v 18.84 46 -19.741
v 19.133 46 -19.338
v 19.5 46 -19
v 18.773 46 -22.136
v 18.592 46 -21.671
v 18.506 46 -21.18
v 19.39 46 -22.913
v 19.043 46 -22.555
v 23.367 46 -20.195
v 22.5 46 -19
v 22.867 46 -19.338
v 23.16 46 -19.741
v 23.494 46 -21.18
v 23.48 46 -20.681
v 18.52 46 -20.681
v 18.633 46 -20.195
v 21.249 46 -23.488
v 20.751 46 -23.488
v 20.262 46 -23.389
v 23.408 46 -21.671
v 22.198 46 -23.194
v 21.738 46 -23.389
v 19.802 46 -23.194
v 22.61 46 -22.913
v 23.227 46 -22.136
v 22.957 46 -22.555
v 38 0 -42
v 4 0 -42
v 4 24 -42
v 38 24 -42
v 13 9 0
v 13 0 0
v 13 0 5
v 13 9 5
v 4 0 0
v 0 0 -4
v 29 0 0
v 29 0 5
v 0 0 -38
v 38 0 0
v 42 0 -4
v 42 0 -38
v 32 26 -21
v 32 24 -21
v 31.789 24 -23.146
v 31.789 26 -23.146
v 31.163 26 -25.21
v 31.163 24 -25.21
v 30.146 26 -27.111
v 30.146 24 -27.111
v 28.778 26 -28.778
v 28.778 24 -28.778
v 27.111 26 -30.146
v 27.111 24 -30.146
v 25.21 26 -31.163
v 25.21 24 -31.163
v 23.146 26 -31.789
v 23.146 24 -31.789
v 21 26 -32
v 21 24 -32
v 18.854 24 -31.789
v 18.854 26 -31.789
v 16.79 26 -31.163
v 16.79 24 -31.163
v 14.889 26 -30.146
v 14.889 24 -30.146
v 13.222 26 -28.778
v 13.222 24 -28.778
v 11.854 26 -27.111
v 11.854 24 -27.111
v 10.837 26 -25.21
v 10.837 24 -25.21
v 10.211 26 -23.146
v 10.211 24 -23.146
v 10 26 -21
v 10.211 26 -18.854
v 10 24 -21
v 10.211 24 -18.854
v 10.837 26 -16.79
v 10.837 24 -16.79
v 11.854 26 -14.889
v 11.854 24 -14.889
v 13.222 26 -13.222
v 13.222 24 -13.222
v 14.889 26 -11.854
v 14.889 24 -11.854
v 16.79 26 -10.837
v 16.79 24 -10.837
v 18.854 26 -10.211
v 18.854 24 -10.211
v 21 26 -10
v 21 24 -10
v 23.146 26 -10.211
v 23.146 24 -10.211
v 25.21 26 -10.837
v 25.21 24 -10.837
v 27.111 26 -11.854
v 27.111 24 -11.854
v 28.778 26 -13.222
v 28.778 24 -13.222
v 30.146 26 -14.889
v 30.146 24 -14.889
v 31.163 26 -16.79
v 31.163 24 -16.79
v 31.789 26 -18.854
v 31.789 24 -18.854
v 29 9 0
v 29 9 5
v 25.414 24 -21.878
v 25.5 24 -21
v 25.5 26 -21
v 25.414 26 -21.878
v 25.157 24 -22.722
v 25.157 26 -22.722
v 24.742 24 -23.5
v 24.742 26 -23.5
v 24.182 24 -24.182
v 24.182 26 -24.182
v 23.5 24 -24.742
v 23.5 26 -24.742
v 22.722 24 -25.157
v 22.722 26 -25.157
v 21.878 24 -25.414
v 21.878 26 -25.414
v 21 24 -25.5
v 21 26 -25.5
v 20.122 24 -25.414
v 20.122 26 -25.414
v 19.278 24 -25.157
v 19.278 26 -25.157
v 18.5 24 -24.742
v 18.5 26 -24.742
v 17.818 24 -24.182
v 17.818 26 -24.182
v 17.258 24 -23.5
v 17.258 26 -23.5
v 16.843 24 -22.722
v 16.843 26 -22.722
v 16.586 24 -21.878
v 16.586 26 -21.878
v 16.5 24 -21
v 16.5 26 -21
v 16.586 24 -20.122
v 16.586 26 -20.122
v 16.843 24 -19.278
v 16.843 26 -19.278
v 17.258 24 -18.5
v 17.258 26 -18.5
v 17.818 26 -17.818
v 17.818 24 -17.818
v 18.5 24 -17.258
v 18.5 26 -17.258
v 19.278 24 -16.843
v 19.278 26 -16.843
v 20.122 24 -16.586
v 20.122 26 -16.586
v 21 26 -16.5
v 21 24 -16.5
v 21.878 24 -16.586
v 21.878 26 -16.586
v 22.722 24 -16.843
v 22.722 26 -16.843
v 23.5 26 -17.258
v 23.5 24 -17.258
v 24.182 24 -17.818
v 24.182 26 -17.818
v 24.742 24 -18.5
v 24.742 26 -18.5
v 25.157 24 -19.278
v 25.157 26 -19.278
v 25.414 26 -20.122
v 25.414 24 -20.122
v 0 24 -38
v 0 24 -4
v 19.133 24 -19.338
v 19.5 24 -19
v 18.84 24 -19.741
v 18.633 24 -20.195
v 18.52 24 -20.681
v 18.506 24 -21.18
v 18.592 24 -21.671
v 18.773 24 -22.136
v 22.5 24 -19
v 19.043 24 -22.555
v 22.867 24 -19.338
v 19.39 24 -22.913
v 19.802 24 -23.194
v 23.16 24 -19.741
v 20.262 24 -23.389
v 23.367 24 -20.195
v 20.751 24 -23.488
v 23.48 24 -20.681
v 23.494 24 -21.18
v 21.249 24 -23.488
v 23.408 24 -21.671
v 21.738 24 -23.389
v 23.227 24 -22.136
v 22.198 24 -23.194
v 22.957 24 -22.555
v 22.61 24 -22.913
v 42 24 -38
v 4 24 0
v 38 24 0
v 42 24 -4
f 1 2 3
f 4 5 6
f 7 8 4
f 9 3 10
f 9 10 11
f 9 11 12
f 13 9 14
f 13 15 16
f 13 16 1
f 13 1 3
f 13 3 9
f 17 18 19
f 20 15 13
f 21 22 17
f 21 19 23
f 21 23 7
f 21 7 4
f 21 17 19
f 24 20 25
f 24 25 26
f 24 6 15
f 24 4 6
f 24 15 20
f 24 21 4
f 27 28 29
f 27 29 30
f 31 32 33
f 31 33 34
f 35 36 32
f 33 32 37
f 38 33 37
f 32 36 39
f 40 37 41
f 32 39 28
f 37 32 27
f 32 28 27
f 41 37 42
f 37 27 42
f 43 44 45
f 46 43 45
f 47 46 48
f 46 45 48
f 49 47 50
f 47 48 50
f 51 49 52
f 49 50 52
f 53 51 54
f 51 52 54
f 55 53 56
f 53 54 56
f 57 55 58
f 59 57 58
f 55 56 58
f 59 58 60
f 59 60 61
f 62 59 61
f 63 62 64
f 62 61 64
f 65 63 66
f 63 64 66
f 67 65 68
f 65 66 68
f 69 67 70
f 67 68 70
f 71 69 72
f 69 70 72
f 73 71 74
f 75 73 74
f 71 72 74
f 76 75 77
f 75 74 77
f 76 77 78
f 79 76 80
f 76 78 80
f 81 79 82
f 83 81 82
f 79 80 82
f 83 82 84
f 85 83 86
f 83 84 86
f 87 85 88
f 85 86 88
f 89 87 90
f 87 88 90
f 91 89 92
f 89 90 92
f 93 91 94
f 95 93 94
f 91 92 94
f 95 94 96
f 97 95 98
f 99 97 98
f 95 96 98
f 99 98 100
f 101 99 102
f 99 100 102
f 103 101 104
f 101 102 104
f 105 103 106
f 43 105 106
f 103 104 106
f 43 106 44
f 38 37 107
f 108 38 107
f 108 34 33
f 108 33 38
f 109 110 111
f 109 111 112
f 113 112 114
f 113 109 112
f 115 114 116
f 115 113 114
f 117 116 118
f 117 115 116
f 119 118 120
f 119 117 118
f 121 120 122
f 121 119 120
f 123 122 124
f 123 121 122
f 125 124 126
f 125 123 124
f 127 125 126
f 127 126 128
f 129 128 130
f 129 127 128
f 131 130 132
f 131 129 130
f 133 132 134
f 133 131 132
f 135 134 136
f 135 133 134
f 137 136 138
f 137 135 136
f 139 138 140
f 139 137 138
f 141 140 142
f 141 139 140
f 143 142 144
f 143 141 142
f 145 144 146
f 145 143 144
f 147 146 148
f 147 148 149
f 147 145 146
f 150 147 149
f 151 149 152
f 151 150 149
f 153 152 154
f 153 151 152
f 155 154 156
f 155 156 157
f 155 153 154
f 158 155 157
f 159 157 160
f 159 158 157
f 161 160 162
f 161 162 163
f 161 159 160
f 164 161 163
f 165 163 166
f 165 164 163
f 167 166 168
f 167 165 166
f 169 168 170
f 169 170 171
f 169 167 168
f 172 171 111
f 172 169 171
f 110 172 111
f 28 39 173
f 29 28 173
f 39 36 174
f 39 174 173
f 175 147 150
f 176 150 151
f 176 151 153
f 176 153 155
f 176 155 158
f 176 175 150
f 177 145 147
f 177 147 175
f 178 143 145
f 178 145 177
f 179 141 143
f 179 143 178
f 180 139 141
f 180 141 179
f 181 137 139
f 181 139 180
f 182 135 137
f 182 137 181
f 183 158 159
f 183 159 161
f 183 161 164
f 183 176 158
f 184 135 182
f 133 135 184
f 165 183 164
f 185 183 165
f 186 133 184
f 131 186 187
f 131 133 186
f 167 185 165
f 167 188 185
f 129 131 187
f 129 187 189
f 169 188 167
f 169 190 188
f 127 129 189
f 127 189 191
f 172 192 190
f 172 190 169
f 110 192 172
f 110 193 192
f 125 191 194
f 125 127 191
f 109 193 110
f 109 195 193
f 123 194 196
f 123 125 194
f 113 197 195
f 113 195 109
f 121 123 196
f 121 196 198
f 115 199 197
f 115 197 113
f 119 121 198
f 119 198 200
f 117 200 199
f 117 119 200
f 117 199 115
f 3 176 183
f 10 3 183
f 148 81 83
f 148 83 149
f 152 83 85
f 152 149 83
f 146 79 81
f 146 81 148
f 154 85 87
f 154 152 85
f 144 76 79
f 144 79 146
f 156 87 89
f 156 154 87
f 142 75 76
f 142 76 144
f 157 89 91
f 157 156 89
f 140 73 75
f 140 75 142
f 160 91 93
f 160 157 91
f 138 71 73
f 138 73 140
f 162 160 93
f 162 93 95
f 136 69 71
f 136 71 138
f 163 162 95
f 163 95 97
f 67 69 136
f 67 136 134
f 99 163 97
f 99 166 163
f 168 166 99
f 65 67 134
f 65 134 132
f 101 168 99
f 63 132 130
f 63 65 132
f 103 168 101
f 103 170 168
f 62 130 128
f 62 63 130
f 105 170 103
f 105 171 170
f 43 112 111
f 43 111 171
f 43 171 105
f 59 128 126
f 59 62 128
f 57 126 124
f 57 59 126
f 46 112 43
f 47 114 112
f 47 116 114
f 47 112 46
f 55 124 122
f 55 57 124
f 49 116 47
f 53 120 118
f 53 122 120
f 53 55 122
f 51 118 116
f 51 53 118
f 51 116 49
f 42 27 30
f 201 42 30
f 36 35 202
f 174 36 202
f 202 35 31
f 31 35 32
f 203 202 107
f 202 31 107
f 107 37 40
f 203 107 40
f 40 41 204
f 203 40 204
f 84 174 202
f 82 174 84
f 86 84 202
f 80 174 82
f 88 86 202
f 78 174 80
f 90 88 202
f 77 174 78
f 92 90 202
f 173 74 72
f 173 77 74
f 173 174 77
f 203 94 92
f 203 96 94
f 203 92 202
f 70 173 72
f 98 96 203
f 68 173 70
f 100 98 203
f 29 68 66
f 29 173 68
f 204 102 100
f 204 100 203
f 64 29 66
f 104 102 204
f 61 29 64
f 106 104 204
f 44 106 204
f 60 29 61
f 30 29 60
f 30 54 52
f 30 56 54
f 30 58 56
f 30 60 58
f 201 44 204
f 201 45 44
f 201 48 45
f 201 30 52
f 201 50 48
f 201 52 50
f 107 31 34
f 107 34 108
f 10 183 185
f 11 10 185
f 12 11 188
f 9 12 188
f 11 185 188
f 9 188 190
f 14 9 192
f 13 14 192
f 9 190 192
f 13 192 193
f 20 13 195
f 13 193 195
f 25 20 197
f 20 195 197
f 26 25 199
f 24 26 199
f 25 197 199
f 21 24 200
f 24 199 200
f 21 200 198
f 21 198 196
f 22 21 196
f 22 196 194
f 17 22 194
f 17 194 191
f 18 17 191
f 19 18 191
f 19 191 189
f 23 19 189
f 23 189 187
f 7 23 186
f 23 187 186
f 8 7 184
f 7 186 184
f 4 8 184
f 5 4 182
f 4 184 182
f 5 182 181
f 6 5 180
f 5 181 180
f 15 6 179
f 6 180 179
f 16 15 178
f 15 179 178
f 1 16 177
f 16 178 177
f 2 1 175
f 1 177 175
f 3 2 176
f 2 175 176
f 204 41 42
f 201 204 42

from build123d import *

# Parameters (mm, degrees)
SKETCH1_W           = 42
SKETCH1_H           = 42
BOSS_EXTRUDE1_DEPTH = 24
SKETCH2_W           = 16
SKETCH2_H           = 9
BOSS_EXTRUDE2_DEPTH = 5
SKETCH3_R           = 11
SKETCH3_R_2         = 4.5
BOSS_EXTRUDE4_DEPTH = 2
BOSS_EXTRUDE5_DEPTH = 22
CHAMFER1_SIZE       = 4
CHAMFER2_SIZE       = 4
CHAMFER3_SIZE       = 4
CHAMFER4_SIZE       = 4


with BuildPart() as part:
    # Sketch1 → Boss-Extrude1 (new body)
    with BuildSketch(Plane(origin=(0, 0, 0), x_dir=(1, 0, 0), z_dir=(0, 1, 0))):
        with Locations((21, 21)):
            Rectangle(SKETCH1_W, SKETCH1_H)
    extrude(amount=BOSS_EXTRUDE1_DEPTH)

    # Sketch2 → Boss-Extrude2 (add)
    with BuildSketch(Plane.XY):
        with Locations((21, 4.5)):
            Rectangle(SKETCH2_W, SKETCH2_H)
    extrude(amount=BOSS_EXTRUDE2_DEPTH)

    # Sketch3 → Boss-Extrude4 (add)
    with BuildSketch(Plane(origin=(0, 24, 0), x_dir=(1, 0, 0), z_dir=(0, 1, 0))):
        with Locations((21, 21)):
            Circle(SKETCH3_R)
        with Locations((21, 21)):
            Circle(SKETCH3_R_2, mode=Mode.SUBTRACT)
    extrude(amount=BOSS_EXTRUDE4_DEPTH)

    # Sketch4 → Boss-Extrude5 (add)
    with BuildSketch(Plane(origin=(0, 24, 0), x_dir=(1, 0, 0), z_dir=(0, 1, 0))):
        with BuildLine():
            Line((19.5, 19), (22.5, 19))
            ThreePointArc((22.5, 19), (21, 23.5), (19.5, 19))
        make_face()
    extrude(amount=BOSS_EXTRUDE5_DEPTH)

    # Chamfer1
    chamfer1_edges = [part.edges().sort_by_distance(p)[0] for p in [
        (0, 12, 0),
    ]]
    chamfer(chamfer1_edges, length=CHAMFER1_SIZE)

    # Chamfer2
    chamfer2_edges = [part.edges().sort_by_distance(p)[0] for p in [
        (42, 12, 0),
    ]]
    chamfer(chamfer2_edges, length=CHAMFER2_SIZE)

    # Chamfer3
    chamfer3_edges = [part.edges().sort_by_distance(p)[0] for p in [
        (42, 12, -42),
    ]]
    chamfer(chamfer3_edges, length=CHAMFER3_SIZE)

    # Chamfer4
    chamfer4_edges = [part.edges().sort_by_distance(p)[0] for p in [
        (0, 12, -42),
    ]]
    chamfer(chamfer4_edges, length=CHAMFER4_SIZE)


solid = part.part
